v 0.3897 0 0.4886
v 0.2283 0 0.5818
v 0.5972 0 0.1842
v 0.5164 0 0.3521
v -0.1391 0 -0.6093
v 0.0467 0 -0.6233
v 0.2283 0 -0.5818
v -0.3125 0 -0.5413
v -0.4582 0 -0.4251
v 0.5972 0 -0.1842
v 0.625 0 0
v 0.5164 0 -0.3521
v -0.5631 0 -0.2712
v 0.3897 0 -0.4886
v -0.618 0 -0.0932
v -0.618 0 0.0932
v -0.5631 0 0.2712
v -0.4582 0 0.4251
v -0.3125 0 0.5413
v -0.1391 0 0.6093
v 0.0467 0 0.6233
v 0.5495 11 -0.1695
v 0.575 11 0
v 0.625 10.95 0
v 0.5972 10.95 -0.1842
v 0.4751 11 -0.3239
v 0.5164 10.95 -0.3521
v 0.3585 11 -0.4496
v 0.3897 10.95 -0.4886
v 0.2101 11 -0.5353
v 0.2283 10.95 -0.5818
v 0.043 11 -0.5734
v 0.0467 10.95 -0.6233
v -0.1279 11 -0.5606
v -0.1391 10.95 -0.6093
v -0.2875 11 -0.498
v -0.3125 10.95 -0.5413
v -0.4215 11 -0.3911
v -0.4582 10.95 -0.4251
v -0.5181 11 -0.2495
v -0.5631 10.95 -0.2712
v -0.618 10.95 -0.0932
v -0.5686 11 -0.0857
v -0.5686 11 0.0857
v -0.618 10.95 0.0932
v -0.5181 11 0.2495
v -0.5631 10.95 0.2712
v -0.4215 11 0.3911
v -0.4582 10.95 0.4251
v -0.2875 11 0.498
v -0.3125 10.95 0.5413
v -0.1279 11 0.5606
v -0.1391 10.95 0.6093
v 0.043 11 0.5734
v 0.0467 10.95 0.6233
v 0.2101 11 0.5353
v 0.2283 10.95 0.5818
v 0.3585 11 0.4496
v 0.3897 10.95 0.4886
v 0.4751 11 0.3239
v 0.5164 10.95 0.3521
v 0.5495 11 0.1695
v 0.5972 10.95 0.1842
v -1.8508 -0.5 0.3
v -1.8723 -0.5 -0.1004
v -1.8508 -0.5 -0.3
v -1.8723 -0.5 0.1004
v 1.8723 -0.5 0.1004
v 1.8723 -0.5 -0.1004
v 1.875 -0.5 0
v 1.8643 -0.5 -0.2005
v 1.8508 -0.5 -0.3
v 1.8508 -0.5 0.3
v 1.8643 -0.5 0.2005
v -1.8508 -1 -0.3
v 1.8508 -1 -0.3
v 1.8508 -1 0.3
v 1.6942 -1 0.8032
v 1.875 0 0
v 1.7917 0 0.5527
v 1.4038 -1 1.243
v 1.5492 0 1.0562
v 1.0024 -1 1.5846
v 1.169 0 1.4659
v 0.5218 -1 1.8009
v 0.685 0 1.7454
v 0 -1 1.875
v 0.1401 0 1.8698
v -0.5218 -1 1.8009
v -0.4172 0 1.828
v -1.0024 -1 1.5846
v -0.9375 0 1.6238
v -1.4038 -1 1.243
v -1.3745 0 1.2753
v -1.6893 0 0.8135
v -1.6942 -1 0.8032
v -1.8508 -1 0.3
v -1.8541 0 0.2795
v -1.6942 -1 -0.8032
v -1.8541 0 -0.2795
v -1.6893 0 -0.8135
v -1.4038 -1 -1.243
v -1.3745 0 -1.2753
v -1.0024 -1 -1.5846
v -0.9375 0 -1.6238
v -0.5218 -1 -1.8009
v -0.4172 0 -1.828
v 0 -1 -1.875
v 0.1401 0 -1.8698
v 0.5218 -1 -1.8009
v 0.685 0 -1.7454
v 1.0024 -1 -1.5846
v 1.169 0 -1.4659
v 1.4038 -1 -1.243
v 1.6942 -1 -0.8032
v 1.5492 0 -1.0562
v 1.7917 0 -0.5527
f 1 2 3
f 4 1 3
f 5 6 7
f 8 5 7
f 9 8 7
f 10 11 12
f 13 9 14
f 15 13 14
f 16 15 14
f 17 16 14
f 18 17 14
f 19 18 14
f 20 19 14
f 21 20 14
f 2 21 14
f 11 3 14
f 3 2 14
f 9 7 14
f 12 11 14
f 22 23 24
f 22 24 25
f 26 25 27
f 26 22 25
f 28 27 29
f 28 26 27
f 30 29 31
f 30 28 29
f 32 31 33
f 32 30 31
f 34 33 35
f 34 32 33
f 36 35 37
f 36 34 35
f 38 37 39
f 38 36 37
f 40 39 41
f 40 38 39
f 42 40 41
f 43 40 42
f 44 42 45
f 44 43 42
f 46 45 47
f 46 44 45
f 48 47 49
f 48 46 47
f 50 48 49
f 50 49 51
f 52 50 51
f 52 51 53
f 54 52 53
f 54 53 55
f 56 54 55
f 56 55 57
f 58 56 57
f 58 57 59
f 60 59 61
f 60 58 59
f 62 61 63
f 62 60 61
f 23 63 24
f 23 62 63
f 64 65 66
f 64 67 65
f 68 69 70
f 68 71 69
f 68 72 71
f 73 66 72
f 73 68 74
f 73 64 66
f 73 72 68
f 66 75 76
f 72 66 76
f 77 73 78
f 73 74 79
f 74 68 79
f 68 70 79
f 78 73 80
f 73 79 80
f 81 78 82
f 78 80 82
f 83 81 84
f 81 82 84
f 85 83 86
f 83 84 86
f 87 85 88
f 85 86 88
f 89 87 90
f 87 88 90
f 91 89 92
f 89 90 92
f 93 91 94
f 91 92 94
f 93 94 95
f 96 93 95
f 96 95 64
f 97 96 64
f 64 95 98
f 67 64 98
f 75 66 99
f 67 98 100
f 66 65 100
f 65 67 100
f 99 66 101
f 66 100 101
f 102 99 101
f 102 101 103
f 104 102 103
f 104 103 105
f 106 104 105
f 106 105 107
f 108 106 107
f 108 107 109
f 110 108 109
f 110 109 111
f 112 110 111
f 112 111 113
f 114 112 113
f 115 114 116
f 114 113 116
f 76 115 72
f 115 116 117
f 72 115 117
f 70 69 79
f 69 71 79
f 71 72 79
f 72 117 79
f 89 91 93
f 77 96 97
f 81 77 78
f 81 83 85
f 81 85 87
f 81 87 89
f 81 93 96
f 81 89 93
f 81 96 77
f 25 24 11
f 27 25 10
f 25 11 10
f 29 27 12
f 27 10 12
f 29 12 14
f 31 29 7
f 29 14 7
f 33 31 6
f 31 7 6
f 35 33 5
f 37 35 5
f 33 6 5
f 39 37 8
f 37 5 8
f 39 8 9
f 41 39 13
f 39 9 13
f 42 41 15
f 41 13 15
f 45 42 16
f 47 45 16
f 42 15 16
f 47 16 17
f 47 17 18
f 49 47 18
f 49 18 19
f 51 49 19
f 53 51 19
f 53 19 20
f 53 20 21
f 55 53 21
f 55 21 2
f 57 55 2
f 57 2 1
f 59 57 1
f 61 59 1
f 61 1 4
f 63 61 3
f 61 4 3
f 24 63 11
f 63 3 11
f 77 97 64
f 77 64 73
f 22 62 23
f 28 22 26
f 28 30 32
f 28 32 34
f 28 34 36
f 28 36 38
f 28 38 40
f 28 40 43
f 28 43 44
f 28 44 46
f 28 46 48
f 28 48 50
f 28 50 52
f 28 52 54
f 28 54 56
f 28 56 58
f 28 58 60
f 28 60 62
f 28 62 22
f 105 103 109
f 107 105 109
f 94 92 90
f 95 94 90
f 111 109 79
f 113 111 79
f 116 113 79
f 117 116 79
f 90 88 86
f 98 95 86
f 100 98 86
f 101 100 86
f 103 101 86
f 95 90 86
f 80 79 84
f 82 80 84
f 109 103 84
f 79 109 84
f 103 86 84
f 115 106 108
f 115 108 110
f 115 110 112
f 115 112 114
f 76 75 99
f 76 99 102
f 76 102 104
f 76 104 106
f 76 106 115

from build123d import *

# Parameters (mm, degrees)
SKETCH1_R           = 0.625
BOSS_EXTRUDE1_DEPTH = 11
SKETCH2_R           = 1.875
BOSS_EXTRUDE2_DEPTH = 1
SKETCH3_W           = 8.196351728
SKETCH3_H           = 0.6
CUT_EXTRUDE1_DEPTH  = 0.5
CHAMFER1_SIZE       = 0.05


with BuildPart() as part:
    # Sketch1 → Boss-Extrude1 (new body)
    with BuildSketch(Plane(origin=(0, 0, 0), x_dir=(1, 0, 0), z_dir=(0, 1, 0))):
        Circle(SKETCH1_R)
    extrude(amount=BOSS_EXTRUDE1_DEPTH)

    # Chamfer1
    chamfer1_edges = [part.edges().sort_by_distance(p)[0] for p in [
        (-0.625, 11, 0),
    ]]
    chamfer(chamfer1_edges, length=CHAMFER1_SIZE)


with BuildPart() as body_2:
    # Sketch2 → Boss-Extrude2 (new body)
    with BuildSketch(Plane.XZ):
        Circle(SKETCH2_R)
    extrude(amount=BOSS_EXTRUDE2_DEPTH)

    # Sketch3 → Cut-Extrude1 (cut)
    with BuildSketch(Plane.XZ.offset(1)):
        Rectangle(SKETCH3_W, SKETCH3_H)
    extrude(amount=-CUT_EXTRUDE1_DEPTH, mode=Mode.SUBTRACT)


solid = Compound([part.part, body_2.part])
